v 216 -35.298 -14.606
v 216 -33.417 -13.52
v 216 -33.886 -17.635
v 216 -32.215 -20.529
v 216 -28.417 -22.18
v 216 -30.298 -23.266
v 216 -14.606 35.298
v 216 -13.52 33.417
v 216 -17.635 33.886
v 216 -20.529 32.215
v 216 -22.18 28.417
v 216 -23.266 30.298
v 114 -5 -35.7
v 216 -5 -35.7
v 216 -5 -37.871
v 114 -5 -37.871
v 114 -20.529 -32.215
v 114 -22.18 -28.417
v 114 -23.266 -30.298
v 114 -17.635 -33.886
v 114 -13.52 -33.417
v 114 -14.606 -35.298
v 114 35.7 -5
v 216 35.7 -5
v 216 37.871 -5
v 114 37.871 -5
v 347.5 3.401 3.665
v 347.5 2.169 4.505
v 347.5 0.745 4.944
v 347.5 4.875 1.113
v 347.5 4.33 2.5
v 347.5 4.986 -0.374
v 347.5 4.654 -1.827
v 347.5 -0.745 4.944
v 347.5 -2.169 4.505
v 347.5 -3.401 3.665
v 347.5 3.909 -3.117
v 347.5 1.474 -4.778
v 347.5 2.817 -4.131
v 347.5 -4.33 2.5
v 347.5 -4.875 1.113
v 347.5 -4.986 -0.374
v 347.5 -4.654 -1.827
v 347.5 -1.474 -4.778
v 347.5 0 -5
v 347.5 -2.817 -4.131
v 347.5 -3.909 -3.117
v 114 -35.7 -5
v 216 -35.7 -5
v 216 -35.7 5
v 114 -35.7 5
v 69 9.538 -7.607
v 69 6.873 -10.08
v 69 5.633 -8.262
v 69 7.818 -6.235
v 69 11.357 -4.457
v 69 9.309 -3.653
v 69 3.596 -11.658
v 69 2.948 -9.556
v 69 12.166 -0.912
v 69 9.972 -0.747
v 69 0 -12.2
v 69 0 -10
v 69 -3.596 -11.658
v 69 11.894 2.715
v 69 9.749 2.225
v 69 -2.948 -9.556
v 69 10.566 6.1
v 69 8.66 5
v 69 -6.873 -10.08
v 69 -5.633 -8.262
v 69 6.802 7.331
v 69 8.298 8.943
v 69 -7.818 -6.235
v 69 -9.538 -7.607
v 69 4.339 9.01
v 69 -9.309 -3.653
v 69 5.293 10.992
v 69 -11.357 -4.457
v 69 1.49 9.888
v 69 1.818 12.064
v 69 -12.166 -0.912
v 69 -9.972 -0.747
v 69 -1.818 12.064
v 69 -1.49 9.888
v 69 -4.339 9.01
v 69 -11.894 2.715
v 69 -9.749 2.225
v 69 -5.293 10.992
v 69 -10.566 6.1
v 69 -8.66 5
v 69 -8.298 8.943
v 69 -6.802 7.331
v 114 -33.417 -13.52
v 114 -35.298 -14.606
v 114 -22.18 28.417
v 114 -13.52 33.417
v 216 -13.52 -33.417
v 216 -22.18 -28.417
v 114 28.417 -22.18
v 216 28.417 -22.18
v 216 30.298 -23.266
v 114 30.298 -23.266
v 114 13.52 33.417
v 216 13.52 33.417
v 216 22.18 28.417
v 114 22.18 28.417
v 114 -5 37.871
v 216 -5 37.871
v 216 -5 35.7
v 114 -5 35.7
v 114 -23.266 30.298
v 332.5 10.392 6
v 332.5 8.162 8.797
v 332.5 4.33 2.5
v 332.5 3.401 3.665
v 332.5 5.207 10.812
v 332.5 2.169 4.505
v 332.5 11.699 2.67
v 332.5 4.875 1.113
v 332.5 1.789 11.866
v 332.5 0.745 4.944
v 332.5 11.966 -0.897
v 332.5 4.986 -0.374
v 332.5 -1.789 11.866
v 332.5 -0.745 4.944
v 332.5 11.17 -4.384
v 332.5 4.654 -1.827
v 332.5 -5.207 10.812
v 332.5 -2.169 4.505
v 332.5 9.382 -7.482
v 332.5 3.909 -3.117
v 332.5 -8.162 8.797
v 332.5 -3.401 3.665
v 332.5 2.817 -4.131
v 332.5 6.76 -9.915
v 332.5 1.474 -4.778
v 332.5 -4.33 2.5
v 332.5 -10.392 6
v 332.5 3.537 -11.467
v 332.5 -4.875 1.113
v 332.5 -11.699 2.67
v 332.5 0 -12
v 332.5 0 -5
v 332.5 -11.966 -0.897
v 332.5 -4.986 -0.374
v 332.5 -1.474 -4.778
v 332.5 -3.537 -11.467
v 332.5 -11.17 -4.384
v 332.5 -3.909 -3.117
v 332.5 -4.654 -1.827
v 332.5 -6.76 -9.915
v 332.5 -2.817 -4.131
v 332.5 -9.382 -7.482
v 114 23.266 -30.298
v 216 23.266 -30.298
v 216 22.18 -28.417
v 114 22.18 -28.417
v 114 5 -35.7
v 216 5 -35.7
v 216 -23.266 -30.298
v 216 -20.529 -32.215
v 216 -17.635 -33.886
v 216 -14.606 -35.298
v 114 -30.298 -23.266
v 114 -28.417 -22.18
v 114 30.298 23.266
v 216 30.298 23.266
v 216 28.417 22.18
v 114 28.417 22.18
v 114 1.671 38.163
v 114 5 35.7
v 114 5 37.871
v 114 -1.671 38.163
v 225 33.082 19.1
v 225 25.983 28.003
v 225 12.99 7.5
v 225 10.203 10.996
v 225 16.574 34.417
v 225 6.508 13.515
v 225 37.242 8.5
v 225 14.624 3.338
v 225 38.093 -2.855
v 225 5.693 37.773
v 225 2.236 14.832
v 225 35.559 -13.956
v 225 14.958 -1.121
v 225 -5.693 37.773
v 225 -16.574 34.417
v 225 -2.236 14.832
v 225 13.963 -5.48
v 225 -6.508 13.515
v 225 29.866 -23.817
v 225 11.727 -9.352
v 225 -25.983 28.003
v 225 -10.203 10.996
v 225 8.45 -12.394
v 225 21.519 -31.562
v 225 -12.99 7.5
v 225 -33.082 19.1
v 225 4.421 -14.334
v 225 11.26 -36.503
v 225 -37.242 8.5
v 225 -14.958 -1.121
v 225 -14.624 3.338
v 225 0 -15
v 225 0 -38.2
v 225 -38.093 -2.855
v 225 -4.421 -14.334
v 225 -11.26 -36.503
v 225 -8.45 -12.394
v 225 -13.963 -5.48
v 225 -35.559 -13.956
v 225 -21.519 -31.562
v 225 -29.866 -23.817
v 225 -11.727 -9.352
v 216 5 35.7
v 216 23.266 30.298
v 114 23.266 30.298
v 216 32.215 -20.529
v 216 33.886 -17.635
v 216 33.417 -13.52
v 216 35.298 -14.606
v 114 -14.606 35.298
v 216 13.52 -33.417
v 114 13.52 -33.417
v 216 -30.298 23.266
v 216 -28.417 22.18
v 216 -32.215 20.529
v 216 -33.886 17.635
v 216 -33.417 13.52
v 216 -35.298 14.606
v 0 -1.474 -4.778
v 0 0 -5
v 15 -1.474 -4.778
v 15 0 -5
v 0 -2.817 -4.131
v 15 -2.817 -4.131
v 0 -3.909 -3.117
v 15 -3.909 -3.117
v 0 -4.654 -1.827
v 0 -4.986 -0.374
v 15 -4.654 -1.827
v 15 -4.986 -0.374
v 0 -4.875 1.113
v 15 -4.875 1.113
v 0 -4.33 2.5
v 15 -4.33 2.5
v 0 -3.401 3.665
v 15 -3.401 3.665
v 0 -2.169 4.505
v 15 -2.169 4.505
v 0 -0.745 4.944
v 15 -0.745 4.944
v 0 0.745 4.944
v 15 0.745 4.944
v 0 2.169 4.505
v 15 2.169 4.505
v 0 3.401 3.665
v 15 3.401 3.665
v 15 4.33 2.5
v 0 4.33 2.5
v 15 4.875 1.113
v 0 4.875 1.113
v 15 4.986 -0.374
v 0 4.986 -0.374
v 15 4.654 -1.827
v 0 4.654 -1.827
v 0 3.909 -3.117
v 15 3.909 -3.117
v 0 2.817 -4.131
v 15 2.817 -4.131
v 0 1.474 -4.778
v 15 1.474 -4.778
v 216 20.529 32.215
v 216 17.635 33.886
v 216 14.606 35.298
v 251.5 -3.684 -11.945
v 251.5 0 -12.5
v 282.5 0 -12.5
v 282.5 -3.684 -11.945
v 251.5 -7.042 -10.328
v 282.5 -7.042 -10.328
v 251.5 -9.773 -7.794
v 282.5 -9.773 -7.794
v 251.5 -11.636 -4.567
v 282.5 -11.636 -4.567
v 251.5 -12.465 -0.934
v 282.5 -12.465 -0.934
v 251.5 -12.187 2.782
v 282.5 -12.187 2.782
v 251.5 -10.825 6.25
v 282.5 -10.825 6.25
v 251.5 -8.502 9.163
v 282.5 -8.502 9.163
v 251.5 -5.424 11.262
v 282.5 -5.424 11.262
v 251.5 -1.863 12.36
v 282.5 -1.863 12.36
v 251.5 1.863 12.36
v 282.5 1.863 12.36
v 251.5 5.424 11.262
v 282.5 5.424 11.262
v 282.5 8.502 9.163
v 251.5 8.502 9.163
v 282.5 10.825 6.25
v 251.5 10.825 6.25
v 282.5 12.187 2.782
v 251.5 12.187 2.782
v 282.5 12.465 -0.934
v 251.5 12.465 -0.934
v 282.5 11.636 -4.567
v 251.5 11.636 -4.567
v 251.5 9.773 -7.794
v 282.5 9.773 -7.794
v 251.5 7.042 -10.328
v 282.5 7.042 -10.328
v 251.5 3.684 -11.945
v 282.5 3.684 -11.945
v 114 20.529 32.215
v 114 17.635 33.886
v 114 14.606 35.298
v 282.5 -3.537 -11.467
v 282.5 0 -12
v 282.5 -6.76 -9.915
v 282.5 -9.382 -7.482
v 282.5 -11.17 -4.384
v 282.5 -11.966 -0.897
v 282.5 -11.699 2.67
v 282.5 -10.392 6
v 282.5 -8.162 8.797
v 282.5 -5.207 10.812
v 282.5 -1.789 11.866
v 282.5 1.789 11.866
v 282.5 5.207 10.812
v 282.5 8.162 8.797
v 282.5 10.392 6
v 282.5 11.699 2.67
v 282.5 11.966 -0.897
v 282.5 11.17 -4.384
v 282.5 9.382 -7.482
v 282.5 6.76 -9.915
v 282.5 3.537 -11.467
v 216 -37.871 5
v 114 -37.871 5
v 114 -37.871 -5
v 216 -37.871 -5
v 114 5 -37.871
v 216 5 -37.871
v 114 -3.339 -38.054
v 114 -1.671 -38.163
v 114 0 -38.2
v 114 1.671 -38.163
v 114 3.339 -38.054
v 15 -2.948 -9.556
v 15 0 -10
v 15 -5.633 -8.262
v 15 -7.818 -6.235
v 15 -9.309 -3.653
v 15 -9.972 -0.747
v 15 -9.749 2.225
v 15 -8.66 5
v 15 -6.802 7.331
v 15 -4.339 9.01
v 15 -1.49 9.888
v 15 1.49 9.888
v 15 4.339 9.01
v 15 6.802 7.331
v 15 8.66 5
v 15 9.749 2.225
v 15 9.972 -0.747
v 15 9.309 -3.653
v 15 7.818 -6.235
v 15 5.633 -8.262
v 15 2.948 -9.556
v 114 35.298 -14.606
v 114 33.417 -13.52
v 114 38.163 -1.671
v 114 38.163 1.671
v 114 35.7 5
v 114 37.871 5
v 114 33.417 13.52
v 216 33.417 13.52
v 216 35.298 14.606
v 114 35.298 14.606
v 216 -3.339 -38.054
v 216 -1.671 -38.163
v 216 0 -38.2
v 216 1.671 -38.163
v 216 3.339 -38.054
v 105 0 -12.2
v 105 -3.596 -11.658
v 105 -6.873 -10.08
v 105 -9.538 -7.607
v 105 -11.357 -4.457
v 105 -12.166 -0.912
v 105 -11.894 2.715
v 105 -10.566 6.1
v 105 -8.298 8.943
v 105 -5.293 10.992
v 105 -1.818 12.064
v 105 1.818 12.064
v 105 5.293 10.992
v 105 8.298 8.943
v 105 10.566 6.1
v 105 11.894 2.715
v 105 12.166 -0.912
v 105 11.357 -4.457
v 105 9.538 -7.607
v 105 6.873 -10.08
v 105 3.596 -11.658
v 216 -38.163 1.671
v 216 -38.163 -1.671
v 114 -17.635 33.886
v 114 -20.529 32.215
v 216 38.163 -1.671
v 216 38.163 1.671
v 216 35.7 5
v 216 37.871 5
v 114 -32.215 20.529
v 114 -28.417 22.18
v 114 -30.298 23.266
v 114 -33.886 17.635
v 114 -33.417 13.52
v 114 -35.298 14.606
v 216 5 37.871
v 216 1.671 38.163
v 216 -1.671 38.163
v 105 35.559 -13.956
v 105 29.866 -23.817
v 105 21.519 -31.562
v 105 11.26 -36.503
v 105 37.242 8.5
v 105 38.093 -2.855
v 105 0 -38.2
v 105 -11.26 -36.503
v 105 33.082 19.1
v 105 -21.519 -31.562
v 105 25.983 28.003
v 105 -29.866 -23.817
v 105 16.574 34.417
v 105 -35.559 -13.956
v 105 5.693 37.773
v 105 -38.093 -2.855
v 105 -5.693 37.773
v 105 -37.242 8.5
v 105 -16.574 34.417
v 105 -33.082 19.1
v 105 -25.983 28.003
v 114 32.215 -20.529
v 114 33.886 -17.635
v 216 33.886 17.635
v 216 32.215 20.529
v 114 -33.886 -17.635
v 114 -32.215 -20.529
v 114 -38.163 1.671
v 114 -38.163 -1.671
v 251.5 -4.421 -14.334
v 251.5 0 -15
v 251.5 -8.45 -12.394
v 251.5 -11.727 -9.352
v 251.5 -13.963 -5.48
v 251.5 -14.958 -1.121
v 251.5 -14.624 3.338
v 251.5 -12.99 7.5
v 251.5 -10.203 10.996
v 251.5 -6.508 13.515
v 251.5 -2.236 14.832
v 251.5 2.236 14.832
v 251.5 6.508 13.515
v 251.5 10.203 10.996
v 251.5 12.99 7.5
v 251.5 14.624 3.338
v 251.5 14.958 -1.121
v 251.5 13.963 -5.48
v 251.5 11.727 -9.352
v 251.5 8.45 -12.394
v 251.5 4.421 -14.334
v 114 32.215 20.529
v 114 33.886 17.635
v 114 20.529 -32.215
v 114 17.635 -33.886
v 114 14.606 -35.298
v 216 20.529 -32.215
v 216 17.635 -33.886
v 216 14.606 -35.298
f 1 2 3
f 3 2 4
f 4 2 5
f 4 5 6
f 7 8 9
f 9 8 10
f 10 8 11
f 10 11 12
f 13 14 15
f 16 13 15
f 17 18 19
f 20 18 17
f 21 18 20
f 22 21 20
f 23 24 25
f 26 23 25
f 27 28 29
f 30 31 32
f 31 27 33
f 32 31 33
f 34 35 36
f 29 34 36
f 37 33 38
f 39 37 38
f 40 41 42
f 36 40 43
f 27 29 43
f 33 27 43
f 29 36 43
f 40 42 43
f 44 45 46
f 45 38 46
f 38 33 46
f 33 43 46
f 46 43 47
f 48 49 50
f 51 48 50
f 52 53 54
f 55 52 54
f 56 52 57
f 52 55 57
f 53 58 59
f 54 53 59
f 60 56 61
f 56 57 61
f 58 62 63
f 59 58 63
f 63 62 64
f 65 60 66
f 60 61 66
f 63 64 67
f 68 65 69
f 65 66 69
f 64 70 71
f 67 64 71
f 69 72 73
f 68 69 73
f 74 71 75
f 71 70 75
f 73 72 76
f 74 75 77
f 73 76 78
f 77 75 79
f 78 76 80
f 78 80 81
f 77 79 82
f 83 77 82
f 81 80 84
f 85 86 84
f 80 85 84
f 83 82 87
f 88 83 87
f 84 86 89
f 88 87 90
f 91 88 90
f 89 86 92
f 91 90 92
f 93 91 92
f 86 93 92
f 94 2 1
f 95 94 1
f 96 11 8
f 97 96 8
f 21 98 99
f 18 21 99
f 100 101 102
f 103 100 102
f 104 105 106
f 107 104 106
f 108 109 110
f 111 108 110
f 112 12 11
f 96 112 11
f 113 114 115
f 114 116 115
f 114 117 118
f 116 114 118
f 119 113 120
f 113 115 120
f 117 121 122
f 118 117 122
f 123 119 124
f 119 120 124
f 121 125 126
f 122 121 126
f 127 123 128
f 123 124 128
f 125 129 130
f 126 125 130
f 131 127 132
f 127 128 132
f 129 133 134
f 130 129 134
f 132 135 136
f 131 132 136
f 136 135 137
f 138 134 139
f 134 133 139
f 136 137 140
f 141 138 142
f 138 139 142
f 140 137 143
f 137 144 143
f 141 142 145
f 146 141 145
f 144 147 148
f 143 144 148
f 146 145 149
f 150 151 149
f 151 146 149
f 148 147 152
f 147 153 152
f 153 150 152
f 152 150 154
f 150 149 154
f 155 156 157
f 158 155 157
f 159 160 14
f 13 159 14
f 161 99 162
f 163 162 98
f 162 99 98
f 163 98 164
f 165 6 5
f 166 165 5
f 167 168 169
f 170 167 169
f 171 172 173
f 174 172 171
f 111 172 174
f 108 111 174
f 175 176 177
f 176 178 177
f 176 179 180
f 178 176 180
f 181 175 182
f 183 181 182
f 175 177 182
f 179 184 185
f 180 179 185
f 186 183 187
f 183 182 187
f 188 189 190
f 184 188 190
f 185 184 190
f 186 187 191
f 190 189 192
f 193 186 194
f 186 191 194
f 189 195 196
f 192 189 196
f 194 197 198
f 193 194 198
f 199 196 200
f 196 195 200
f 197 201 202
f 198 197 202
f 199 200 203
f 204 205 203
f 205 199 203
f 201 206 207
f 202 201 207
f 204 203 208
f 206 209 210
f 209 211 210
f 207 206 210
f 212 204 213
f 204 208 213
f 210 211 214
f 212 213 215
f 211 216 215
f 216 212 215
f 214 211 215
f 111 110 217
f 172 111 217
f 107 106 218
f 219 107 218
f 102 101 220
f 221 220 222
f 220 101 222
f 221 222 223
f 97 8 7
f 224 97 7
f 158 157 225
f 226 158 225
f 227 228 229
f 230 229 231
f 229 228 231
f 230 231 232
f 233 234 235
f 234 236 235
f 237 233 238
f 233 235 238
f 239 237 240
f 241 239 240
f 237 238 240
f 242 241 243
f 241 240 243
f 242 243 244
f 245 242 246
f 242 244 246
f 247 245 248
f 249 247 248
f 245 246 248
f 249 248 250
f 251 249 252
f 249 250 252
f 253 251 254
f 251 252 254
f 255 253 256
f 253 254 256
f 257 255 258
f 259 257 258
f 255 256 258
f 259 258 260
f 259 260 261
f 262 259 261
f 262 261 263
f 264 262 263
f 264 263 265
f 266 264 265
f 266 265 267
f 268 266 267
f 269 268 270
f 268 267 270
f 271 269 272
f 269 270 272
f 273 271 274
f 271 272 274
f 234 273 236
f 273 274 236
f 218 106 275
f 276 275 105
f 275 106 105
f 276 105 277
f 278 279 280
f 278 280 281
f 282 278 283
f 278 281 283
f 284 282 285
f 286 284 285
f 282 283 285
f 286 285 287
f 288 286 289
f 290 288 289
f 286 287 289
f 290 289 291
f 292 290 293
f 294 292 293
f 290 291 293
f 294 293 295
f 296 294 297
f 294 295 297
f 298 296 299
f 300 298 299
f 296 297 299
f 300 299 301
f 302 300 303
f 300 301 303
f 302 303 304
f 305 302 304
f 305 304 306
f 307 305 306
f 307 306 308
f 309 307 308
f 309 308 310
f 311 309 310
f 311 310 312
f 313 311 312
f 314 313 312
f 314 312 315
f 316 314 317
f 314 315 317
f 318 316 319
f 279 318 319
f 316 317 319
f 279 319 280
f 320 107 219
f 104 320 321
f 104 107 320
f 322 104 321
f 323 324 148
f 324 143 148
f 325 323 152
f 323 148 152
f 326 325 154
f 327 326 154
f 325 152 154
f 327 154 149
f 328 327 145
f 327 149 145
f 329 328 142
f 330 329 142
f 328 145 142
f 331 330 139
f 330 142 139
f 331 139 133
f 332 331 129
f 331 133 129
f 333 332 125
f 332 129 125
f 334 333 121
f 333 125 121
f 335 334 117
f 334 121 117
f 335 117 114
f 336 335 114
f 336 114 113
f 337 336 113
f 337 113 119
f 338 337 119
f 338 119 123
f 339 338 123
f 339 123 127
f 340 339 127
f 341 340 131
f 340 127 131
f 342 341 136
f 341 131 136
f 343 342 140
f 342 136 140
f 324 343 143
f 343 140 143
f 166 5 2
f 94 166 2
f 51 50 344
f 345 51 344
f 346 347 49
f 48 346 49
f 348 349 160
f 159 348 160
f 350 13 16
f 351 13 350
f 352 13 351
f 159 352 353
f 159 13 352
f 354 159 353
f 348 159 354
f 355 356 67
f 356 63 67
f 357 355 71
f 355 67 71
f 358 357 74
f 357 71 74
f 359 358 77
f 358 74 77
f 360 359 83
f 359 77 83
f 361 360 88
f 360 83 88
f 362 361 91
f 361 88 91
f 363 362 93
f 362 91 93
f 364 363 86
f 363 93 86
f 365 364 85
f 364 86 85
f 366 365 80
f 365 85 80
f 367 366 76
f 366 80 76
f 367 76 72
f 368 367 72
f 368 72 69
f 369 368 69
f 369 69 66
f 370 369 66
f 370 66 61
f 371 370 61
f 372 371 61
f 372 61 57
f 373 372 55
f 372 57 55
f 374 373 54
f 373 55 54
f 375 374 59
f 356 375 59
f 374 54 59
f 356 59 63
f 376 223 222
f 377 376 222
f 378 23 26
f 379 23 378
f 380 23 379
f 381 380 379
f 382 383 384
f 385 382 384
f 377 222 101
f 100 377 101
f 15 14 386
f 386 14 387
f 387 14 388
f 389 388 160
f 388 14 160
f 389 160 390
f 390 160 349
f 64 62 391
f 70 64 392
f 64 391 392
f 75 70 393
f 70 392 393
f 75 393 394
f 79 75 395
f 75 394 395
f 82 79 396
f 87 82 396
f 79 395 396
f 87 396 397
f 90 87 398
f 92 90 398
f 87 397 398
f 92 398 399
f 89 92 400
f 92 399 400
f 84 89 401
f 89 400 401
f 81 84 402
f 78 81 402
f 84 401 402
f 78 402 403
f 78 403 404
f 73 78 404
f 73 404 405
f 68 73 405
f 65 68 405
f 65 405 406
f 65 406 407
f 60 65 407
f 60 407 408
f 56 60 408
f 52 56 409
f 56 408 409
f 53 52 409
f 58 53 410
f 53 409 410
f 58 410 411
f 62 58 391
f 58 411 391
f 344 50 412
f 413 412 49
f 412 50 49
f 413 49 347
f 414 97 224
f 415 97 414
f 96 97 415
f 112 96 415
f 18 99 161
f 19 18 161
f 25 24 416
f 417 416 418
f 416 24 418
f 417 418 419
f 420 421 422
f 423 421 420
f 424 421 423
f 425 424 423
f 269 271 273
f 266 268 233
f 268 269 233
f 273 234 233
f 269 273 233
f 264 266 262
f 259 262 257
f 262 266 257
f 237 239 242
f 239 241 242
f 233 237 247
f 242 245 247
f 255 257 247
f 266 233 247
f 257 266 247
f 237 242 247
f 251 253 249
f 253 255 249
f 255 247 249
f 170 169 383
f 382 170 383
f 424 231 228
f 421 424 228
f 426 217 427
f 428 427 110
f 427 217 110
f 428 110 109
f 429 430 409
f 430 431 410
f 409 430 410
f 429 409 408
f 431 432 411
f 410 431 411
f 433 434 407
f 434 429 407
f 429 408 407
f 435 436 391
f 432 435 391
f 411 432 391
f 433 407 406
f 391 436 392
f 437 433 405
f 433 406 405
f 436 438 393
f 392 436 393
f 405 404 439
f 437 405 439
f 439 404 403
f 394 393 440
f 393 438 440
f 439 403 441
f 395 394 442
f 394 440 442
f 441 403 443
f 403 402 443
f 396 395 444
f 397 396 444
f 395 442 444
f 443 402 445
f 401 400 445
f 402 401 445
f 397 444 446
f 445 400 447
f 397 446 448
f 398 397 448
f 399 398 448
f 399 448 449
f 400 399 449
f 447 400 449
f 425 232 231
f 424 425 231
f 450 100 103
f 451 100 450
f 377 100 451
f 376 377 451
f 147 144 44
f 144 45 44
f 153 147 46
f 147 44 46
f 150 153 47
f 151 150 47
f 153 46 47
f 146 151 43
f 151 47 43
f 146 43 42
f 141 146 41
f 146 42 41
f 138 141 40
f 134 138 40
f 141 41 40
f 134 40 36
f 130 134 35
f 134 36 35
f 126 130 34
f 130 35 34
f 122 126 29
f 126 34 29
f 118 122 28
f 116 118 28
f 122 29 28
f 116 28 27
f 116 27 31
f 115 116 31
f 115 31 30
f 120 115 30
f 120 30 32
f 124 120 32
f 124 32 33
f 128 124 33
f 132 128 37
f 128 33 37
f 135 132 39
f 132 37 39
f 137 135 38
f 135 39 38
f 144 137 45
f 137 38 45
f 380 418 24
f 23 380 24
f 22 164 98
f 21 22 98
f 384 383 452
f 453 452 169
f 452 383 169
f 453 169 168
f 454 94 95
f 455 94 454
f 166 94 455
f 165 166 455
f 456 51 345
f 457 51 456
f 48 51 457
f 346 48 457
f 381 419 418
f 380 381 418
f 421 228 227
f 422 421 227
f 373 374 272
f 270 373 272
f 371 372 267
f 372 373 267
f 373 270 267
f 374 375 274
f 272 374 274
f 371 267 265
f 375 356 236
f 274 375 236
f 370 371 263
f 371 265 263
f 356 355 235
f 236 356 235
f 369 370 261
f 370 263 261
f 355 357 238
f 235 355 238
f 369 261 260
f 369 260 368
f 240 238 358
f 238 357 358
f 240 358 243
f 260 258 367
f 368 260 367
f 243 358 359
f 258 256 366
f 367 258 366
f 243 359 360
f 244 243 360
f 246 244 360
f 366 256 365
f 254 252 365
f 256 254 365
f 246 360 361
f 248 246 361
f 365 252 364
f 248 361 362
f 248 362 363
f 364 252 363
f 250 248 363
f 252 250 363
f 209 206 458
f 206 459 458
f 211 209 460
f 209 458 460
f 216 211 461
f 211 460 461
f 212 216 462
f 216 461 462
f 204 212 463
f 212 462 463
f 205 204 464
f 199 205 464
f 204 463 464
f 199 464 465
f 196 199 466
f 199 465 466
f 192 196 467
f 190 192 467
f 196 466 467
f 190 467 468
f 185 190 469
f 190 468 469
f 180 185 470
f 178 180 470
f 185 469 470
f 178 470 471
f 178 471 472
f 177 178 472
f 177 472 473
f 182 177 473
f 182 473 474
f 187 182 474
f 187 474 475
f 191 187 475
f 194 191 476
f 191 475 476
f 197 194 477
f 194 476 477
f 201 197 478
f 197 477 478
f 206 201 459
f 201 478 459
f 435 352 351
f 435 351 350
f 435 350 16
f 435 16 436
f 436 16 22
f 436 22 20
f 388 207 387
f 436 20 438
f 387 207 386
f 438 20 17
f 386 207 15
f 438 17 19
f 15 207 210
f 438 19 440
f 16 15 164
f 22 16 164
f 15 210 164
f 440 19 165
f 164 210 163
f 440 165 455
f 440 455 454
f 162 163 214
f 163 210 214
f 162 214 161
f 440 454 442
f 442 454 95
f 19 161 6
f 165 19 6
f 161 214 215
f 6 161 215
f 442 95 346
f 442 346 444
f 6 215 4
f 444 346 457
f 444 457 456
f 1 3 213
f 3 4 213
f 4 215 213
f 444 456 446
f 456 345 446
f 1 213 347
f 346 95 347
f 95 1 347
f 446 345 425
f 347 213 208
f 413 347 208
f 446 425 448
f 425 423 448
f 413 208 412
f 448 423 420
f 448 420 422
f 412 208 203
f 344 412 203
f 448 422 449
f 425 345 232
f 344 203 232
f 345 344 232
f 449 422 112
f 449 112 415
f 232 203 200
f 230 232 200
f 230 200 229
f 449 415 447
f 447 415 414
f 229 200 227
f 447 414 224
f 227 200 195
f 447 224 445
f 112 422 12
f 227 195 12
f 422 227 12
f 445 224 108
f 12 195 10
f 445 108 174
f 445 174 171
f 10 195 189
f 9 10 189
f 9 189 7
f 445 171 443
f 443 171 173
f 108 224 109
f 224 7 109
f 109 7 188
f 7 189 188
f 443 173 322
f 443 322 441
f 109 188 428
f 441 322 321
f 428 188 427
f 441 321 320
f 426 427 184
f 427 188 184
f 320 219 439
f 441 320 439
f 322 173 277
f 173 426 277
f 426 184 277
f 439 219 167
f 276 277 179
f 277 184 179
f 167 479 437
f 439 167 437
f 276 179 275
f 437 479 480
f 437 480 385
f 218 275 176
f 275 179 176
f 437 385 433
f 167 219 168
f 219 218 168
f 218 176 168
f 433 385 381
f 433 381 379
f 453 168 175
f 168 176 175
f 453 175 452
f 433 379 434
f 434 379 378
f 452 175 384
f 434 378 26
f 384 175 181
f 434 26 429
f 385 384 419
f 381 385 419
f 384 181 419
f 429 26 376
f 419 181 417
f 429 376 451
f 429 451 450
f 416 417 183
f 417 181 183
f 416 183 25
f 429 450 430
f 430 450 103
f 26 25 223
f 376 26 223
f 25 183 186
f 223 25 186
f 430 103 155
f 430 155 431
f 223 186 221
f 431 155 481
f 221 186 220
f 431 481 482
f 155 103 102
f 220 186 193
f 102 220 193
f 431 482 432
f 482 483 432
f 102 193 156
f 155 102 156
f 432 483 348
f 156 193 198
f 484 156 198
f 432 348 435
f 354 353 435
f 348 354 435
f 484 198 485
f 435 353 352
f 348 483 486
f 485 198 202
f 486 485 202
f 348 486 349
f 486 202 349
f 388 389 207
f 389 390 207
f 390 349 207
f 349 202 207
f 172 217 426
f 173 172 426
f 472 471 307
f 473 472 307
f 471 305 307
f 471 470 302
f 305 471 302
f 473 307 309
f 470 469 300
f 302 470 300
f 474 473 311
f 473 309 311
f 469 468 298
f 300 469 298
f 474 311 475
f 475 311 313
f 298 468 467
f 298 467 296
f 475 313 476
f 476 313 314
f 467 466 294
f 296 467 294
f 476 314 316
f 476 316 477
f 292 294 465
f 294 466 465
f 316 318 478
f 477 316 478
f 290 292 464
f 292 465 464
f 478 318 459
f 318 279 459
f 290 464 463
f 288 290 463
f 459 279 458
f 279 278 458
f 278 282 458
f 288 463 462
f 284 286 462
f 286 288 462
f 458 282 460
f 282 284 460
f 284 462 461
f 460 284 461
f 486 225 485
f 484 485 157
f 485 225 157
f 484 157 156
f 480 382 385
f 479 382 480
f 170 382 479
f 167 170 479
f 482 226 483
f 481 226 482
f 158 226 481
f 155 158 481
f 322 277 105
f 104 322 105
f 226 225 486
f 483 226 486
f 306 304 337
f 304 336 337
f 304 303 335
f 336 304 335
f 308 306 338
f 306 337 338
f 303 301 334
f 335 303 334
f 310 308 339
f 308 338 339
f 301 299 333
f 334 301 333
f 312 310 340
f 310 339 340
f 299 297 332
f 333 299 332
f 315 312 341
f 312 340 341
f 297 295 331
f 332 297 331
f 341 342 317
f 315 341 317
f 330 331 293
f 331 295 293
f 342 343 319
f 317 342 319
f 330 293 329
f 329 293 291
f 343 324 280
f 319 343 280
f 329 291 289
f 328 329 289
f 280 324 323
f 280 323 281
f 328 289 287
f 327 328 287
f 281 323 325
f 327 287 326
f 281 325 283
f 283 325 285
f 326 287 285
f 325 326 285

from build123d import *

# Parameters (mm, degrees)
CUT_EXTRUDE2_DEPTH = 102
CIRPATTERN2_COUNT  = 12


with BuildPart() as part:
    # Sketch1 → Revolve1 (revolve)
    with BuildSketch(Plane.XY, mode=Mode.PRIVATE) as revolve1_sk:
        Polygon((0, 0), (0, 5), (15, 5), (15, 10), (69, 10), (69, 12.2), (105, 12.2), (105, 38.2), (225, 38.2), (225, 15), (251.5, 15), (251.5, 12.5), (282.5, 12.5), (282.5, 12), (332.5, 12), (332.5, 5), (347.5, 5), (347.5, 0), align=None)
    revolve(revolve1_sk.sketch.rotate(Axis((347.5, 0, 0), (-1, 0, 0)), 90), axis=Axis((347.5, 0, 0), (-1, 0, 0)))  # turned: the seam where the file's is

    # Sketch2 → Cut-Extrude2 (cut)
    with BuildSketch(Plane(origin=(216, 0, 0), x_dir=(0, 0, -1), z_dir=(1, 0, 0))):
        Polygon((38.2, 0), (38.2, 5), (35.7, 5), (35.7, -5), (38.2, -5), align=None)
    cut_extrude2 = extrude(amount=-CUT_EXTRUDE2_DEPTH, mode=Mode.SUBTRACT)

    # CirPattern2: Cut-Extrude2 ×12 about axis
    cirpattern2_axis = Axis((0, 0, 0), (1, 0, 0))
    for i in range(1, CIRPATTERN2_COUNT):
        add(cut_extrude2.rotate(cirpattern2_axis, i * 360 / CIRPATTERN2_COUNT), mode=Mode.SUBTRACT)


solid = part.part
